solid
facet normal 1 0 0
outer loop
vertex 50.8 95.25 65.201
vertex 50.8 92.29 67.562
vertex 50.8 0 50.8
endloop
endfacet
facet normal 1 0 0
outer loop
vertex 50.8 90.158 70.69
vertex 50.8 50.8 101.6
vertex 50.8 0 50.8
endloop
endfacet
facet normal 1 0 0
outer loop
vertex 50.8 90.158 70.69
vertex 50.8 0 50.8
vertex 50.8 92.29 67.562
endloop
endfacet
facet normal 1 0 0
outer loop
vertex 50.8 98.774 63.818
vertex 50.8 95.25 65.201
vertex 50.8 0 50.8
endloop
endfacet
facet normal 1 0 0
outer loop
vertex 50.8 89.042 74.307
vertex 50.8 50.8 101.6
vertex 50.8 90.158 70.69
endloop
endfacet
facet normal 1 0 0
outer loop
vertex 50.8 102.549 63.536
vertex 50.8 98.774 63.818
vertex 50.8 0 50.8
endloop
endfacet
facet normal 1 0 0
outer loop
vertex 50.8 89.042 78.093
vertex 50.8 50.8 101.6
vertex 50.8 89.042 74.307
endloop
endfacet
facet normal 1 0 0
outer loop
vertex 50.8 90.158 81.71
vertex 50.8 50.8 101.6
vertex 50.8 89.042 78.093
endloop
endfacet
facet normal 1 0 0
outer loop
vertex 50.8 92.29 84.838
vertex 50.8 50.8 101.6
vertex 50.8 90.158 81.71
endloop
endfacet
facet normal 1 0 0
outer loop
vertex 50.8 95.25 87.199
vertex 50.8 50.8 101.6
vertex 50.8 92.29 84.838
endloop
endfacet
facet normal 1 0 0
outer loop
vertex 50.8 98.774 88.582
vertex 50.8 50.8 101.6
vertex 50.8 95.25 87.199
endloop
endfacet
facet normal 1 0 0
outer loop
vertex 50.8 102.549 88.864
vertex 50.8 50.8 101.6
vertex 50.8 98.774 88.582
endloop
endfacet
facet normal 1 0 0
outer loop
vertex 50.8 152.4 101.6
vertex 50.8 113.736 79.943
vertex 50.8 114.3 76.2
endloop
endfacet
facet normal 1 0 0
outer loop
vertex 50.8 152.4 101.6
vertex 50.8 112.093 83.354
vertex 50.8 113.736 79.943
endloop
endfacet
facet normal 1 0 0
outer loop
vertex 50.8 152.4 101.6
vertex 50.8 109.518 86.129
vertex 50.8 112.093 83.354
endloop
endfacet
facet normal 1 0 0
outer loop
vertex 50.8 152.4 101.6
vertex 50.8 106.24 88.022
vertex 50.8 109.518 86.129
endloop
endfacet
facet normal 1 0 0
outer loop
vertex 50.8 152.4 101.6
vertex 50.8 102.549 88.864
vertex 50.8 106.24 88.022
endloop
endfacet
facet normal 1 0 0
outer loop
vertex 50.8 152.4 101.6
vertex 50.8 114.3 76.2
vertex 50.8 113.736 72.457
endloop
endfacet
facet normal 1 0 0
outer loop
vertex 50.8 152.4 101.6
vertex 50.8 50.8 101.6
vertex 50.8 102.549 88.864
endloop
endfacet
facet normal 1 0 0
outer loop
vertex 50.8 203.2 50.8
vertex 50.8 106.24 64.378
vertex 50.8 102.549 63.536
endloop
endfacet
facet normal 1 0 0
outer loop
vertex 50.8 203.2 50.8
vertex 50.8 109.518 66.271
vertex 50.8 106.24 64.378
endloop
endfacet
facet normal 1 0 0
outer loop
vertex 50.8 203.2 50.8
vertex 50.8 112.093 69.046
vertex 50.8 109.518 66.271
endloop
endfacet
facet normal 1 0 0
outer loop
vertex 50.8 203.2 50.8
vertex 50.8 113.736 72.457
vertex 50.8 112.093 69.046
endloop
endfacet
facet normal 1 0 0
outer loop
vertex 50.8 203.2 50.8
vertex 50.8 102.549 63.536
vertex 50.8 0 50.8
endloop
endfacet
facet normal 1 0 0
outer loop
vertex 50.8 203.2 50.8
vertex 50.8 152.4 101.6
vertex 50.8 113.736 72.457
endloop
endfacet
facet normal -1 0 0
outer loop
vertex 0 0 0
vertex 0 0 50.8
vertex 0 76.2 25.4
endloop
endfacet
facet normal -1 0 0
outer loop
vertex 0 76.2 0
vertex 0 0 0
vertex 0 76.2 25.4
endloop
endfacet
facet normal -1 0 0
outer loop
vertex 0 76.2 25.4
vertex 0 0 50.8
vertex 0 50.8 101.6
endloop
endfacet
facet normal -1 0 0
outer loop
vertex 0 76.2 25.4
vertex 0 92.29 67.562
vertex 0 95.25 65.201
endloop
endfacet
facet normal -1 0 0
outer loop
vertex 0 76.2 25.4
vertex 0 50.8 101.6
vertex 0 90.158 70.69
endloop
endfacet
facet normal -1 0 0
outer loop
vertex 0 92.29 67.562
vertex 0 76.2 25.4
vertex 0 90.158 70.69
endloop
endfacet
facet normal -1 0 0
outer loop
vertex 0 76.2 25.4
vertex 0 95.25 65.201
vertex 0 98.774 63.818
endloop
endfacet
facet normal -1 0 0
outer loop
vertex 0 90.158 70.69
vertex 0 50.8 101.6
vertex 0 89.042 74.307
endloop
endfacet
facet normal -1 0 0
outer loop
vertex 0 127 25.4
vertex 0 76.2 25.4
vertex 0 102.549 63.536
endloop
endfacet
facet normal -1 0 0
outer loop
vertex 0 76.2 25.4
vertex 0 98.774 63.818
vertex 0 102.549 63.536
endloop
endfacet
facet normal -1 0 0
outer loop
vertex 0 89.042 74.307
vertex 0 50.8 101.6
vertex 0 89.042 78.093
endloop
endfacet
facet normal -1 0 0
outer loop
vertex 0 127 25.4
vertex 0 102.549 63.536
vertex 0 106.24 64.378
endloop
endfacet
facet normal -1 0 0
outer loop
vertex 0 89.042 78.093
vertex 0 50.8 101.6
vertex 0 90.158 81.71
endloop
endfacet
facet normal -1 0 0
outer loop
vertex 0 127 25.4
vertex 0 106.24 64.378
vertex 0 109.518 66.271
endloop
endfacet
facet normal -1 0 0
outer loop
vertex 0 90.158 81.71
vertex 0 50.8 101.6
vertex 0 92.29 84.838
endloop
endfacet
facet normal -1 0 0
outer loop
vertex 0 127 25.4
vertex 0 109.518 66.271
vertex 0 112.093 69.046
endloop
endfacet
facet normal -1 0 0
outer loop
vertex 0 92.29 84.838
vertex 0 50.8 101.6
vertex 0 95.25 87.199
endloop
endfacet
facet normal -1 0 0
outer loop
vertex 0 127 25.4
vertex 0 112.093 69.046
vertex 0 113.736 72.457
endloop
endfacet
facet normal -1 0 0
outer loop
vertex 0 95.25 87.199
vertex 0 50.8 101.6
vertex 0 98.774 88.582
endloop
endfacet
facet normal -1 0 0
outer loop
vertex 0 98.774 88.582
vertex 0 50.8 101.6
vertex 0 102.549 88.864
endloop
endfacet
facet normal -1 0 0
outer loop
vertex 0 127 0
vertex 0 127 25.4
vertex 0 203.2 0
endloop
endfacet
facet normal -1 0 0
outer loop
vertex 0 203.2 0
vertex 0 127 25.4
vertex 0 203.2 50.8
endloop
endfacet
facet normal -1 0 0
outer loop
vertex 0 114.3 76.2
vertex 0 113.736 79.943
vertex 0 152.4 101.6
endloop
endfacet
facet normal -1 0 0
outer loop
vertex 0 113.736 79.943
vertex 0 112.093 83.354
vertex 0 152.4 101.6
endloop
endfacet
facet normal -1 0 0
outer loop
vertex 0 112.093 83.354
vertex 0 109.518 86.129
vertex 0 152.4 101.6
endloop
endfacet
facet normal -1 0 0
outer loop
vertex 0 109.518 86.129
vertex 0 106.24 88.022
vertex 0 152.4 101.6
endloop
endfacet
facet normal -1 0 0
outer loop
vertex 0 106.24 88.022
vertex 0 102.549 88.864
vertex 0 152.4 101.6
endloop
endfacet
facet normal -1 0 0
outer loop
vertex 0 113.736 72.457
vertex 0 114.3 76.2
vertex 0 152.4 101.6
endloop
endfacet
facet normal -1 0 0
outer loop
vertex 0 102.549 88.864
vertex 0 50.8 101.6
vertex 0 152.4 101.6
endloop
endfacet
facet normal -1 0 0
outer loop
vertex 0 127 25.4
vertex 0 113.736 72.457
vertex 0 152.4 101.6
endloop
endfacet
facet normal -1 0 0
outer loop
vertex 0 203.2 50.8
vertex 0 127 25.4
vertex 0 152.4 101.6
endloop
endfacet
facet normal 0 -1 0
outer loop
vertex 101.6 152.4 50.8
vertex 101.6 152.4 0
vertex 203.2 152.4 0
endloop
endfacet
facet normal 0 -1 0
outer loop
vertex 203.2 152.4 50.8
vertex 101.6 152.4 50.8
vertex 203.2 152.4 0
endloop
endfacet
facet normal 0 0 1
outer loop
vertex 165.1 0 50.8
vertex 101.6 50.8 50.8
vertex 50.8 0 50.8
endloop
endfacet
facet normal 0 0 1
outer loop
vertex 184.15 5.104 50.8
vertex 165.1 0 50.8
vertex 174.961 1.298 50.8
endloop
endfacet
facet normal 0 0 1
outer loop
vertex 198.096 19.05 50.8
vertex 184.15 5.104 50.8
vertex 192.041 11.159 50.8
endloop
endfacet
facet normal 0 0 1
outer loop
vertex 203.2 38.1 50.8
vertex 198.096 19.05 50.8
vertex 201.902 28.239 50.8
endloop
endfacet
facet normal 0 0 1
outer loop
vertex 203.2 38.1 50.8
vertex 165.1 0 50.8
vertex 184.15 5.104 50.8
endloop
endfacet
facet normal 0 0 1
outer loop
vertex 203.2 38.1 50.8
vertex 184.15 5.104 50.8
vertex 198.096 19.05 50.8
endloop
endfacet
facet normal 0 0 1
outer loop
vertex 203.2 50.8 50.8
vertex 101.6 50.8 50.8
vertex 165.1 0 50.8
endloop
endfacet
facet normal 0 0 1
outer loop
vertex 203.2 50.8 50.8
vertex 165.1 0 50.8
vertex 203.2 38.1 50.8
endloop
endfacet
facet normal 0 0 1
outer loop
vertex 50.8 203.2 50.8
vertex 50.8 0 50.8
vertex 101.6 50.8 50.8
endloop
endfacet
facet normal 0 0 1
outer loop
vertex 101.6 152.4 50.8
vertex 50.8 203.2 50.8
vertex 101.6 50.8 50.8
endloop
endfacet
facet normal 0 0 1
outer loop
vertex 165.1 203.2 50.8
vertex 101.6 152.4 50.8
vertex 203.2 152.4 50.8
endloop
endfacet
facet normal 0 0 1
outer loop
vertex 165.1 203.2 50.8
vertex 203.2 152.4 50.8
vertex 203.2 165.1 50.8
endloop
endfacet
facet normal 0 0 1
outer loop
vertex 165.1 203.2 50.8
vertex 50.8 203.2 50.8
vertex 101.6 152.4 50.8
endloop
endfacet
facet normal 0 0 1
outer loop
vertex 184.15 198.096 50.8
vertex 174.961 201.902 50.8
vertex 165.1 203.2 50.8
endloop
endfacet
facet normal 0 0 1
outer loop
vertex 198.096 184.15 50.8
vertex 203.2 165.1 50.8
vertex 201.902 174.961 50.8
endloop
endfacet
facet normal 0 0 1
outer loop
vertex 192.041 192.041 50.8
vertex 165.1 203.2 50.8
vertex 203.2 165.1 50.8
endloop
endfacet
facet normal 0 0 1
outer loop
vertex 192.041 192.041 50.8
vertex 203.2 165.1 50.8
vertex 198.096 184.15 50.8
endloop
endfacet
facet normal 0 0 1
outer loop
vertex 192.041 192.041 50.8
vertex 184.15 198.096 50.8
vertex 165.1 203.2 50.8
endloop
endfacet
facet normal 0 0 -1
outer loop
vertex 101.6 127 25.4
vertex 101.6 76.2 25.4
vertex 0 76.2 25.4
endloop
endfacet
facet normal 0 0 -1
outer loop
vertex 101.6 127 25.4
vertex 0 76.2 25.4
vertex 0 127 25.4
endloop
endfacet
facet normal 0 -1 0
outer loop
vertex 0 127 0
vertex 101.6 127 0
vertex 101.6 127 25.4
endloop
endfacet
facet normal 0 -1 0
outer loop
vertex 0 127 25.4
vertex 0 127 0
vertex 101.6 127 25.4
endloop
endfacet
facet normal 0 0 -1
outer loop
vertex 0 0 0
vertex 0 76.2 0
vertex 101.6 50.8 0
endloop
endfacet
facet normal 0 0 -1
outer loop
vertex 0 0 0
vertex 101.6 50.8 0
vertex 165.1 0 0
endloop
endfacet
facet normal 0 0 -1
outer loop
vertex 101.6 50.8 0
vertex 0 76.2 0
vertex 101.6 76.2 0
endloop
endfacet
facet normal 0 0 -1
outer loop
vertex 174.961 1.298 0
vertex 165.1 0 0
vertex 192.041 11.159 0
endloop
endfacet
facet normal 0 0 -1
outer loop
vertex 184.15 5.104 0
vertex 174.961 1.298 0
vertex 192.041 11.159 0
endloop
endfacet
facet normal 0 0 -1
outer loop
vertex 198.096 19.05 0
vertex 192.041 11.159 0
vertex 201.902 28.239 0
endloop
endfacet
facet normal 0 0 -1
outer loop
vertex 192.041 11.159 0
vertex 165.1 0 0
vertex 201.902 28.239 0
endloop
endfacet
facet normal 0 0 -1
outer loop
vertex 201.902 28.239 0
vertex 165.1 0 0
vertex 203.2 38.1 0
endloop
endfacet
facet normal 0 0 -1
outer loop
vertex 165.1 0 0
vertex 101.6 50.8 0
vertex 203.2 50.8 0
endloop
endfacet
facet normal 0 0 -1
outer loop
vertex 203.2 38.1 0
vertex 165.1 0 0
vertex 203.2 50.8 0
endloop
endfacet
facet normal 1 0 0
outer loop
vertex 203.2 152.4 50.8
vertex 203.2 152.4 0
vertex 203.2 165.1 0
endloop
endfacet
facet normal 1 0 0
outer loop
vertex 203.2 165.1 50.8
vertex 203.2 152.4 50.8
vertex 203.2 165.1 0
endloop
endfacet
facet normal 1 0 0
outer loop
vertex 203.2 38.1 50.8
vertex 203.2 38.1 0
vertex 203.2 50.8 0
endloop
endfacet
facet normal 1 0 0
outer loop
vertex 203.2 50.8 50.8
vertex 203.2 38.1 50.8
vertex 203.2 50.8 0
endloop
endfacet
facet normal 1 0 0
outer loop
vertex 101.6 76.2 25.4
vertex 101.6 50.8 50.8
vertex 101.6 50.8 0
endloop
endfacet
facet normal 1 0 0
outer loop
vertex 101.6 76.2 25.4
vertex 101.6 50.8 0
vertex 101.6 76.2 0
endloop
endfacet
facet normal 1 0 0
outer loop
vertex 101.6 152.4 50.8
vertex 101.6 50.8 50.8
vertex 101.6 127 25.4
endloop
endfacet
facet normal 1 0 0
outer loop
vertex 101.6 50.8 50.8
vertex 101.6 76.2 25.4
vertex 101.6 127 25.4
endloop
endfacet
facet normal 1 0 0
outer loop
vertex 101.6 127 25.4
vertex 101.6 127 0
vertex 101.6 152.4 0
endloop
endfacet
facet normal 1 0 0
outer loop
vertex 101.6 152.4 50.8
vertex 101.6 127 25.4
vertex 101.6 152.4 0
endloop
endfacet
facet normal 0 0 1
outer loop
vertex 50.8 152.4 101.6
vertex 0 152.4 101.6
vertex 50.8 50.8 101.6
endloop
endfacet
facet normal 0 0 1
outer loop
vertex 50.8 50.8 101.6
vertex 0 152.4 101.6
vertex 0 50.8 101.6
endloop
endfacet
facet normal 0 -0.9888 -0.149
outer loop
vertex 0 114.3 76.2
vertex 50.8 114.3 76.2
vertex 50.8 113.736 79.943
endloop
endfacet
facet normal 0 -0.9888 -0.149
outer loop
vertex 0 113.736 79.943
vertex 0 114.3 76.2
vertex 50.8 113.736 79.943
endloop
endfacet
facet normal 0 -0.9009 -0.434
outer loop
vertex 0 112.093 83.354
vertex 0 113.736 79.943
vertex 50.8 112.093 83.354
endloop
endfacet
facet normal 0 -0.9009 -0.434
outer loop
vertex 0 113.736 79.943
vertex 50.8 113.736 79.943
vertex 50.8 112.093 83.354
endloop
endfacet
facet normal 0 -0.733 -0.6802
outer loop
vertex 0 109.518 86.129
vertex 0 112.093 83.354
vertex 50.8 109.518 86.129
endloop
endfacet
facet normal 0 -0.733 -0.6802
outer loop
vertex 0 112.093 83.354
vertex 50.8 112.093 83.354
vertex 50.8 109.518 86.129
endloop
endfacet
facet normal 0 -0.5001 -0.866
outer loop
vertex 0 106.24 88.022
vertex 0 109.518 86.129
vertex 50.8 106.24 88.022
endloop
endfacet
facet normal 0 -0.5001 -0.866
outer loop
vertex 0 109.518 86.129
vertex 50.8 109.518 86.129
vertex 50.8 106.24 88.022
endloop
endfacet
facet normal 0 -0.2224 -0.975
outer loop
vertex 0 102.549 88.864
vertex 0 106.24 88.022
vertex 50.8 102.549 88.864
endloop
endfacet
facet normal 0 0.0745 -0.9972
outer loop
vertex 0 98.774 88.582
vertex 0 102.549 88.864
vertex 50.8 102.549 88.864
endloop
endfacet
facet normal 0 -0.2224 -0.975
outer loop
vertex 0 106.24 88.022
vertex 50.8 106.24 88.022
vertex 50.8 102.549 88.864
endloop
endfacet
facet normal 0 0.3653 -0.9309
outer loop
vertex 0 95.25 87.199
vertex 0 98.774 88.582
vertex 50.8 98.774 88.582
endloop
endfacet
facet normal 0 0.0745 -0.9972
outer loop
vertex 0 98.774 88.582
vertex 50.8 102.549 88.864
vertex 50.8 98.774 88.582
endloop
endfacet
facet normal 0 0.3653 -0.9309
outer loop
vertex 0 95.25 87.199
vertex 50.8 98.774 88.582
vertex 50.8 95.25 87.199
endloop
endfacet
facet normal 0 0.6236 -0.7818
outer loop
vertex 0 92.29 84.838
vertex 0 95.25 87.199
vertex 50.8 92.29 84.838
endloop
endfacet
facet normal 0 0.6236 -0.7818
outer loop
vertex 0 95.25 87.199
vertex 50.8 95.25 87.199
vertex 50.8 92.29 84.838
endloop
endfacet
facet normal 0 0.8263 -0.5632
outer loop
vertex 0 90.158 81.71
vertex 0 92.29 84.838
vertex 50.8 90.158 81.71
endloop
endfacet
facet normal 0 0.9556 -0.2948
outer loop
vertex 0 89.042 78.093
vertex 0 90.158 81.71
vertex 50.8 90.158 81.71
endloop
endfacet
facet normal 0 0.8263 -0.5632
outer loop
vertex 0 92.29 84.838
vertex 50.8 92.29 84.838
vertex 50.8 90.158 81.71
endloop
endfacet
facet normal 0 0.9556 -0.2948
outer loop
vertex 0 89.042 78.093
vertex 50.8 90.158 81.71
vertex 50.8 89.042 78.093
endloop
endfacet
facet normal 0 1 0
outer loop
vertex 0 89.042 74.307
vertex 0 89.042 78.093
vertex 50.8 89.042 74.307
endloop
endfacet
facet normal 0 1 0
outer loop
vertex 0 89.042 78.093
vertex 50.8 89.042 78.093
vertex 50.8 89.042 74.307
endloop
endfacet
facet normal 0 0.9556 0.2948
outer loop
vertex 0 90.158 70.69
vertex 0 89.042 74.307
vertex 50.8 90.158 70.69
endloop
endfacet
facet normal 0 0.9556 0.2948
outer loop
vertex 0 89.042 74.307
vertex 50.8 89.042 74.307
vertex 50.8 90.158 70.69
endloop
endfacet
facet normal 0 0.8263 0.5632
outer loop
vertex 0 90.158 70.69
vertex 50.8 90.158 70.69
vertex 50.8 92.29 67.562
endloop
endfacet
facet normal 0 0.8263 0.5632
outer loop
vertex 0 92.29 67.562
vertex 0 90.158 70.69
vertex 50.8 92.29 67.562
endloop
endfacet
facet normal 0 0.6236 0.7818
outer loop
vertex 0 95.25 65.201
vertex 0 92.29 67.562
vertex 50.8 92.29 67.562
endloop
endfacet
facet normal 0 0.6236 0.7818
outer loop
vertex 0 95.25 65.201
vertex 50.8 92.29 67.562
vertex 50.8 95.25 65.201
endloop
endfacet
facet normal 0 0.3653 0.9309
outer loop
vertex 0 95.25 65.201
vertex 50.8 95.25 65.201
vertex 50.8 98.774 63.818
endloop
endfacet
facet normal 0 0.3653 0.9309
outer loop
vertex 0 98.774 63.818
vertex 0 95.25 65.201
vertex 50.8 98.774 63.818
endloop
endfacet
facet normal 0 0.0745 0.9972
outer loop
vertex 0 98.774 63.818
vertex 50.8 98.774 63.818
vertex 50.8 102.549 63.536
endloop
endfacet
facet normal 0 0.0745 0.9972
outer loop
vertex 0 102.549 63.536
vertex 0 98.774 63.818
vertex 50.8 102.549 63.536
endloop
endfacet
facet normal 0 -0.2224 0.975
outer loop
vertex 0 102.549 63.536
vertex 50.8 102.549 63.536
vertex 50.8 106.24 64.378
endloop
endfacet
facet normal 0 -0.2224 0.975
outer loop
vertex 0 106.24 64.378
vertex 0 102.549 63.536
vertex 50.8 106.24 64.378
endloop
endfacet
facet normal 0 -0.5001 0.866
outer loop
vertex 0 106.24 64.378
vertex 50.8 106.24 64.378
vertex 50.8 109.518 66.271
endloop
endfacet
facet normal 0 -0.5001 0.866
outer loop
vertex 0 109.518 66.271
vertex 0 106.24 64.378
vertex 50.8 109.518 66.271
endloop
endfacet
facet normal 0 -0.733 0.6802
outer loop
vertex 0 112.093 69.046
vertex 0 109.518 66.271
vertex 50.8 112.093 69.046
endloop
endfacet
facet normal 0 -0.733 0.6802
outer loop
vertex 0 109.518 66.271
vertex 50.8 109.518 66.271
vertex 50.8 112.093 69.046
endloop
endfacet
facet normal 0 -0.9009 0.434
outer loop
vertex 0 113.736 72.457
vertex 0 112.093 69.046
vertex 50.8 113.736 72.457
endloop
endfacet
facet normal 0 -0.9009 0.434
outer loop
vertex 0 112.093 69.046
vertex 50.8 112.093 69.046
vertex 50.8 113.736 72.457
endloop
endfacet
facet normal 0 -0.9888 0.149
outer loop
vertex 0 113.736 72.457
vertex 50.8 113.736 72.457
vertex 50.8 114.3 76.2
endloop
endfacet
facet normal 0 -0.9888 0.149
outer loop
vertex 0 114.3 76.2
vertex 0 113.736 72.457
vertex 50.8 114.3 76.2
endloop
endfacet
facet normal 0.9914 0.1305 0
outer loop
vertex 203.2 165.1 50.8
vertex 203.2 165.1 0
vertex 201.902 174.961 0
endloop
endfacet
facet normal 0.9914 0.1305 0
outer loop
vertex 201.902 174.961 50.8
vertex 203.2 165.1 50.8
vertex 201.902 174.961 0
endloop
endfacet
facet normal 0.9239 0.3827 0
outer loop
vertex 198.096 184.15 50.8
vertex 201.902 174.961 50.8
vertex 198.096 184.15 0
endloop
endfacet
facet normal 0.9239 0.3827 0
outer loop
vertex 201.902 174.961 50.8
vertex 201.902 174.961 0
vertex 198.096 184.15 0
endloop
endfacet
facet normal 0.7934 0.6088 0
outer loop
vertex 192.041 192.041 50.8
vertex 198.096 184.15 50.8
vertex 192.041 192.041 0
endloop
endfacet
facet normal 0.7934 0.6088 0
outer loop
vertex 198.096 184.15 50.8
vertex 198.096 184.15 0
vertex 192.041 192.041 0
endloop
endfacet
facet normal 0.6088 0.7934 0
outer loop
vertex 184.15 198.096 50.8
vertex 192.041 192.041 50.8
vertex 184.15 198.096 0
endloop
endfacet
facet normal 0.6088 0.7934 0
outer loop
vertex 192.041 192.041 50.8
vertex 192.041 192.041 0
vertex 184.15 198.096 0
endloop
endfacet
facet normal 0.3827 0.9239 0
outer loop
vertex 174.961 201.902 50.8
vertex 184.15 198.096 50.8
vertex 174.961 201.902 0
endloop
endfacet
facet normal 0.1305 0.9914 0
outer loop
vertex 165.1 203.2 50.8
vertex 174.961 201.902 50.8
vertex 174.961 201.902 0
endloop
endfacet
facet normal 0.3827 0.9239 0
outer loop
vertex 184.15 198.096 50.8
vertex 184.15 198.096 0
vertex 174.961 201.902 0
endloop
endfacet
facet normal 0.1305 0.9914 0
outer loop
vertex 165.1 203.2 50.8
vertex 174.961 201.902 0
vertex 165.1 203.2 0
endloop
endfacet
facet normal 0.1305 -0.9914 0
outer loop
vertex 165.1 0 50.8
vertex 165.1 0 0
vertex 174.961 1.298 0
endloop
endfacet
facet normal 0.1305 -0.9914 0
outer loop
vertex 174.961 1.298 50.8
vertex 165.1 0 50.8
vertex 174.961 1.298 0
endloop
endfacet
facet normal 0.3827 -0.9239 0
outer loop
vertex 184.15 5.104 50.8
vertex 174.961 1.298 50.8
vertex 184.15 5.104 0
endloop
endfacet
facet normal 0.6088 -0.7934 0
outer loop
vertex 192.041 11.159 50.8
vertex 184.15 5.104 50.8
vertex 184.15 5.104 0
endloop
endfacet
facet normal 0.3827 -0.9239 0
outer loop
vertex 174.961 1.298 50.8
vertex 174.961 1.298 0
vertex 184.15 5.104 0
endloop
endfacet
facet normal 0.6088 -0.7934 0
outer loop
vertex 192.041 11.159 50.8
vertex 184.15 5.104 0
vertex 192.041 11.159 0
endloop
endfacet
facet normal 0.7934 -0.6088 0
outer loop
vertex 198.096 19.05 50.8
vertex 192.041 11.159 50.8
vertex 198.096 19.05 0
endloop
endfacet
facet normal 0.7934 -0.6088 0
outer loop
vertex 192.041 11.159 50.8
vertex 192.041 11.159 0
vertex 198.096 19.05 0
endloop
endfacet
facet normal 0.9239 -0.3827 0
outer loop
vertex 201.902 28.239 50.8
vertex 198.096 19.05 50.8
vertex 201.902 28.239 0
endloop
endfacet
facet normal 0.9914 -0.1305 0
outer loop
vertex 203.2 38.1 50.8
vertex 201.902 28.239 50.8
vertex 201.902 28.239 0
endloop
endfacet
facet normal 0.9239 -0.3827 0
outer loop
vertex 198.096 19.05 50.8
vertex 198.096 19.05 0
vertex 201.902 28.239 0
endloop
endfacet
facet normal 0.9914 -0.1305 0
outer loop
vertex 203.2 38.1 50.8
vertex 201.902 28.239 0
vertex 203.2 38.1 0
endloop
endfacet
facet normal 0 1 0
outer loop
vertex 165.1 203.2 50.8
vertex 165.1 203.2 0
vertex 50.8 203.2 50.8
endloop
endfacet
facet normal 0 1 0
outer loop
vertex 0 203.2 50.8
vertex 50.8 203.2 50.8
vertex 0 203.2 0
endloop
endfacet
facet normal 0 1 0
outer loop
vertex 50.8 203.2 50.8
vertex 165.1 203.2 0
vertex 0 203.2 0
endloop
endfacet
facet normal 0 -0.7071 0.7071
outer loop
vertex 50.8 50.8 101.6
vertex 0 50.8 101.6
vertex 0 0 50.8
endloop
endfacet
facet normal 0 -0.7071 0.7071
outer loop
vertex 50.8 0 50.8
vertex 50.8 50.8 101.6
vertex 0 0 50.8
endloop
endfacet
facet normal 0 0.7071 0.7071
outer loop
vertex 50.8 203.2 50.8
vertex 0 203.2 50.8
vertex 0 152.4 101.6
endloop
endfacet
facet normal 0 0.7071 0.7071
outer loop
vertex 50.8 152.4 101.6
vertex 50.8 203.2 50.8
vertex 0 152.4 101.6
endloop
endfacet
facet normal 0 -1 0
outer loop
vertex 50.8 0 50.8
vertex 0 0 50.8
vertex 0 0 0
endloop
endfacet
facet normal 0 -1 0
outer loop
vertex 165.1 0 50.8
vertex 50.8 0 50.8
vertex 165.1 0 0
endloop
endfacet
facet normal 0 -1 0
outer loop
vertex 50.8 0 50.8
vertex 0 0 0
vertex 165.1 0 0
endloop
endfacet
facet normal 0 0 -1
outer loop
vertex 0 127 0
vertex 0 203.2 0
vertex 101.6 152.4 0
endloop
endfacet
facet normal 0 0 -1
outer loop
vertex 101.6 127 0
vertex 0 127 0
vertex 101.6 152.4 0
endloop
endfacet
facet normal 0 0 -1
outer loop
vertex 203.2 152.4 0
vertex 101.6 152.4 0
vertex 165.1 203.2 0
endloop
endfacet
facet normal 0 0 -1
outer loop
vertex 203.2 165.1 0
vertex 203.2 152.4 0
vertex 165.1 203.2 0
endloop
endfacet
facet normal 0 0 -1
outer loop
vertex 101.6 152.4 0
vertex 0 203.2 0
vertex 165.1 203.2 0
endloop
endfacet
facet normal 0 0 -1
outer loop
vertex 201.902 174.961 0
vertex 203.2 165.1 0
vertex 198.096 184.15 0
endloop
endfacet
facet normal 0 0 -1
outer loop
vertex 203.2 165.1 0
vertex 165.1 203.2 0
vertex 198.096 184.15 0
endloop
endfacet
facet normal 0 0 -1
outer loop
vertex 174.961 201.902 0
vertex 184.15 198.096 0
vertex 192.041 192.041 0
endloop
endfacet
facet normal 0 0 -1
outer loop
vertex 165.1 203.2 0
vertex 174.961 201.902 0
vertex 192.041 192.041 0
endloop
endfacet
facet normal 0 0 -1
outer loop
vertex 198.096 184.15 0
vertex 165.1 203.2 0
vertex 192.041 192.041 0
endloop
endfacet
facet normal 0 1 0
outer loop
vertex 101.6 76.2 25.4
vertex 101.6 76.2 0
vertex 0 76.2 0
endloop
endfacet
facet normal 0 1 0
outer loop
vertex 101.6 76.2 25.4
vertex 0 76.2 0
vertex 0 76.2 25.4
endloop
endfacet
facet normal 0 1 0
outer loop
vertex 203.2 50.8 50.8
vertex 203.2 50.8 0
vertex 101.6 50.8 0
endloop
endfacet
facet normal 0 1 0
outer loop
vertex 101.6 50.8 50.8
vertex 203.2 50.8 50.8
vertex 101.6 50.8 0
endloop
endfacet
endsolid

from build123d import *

# Parameters (mm, degrees)
F1_DEPTH = 50.8
F3_DEPTH = 50.8
F4_R     = 12.7
F5_DEPTH = 50.8
F6_W     = 50.8
F6_H     = 25.4
F7_DEPTH = 101.6


with BuildPart() as f1:
    # F0 (on Top) → F1 (new body)
    with BuildSketch(Plane.XY):
        with BuildLine():
            Line((165.1, 203.2), (0, 203.2))
            Line((0, 203.2), (0, 0))
            Line((0, 0), (165.1, 0))
            ThreePointArc((165.1, 0), (192.040768, 11.159232), (203.2, 38.1))
            Line((203.2, 38.1), (203.2, 50.8))
            Line((203.2, 50.8), (101.6, 50.8))
            Line((101.6, 50.8), (101.6, 152.4))
            Line((101.6, 152.4), (203.2, 152.4))
            Line((203.2, 152.4), (203.2, 165.1))
            ThreePointArc((203.2, 165.1), (192.040768, 192.040768), (165.1, 203.2))
        make_face()
    extrude(amount=F1_DEPTH)

    # F2 (on Right) → F3 (join)
    with BuildSketch(Plane.YZ):
        Polygon((152.4, 101.6), (50.8, 101.6), (0, 50.8), (203.2, 50.8), align=None)
    extrude(amount=F3_DEPTH)

    # F4 (on face) → F5 (cut)
    with BuildSketch(Plane.YZ.offset(50.8)):
        with Locations((101.6, 76.2)):
            Circle(F4_R)
    extrude(amount=-F5_DEPTH, mode=Mode.SUBTRACT)

    # F6 (on face) → F7 (cut)
    with BuildSketch(Plane.YZ.offset(101.6)):
        with Locations((101.6, 12.7)):
            Rectangle(F6_W, F6_H)
    extrude(amount=-F7_DEPTH, mode=Mode.SUBTRACT)


solid = f1.part
